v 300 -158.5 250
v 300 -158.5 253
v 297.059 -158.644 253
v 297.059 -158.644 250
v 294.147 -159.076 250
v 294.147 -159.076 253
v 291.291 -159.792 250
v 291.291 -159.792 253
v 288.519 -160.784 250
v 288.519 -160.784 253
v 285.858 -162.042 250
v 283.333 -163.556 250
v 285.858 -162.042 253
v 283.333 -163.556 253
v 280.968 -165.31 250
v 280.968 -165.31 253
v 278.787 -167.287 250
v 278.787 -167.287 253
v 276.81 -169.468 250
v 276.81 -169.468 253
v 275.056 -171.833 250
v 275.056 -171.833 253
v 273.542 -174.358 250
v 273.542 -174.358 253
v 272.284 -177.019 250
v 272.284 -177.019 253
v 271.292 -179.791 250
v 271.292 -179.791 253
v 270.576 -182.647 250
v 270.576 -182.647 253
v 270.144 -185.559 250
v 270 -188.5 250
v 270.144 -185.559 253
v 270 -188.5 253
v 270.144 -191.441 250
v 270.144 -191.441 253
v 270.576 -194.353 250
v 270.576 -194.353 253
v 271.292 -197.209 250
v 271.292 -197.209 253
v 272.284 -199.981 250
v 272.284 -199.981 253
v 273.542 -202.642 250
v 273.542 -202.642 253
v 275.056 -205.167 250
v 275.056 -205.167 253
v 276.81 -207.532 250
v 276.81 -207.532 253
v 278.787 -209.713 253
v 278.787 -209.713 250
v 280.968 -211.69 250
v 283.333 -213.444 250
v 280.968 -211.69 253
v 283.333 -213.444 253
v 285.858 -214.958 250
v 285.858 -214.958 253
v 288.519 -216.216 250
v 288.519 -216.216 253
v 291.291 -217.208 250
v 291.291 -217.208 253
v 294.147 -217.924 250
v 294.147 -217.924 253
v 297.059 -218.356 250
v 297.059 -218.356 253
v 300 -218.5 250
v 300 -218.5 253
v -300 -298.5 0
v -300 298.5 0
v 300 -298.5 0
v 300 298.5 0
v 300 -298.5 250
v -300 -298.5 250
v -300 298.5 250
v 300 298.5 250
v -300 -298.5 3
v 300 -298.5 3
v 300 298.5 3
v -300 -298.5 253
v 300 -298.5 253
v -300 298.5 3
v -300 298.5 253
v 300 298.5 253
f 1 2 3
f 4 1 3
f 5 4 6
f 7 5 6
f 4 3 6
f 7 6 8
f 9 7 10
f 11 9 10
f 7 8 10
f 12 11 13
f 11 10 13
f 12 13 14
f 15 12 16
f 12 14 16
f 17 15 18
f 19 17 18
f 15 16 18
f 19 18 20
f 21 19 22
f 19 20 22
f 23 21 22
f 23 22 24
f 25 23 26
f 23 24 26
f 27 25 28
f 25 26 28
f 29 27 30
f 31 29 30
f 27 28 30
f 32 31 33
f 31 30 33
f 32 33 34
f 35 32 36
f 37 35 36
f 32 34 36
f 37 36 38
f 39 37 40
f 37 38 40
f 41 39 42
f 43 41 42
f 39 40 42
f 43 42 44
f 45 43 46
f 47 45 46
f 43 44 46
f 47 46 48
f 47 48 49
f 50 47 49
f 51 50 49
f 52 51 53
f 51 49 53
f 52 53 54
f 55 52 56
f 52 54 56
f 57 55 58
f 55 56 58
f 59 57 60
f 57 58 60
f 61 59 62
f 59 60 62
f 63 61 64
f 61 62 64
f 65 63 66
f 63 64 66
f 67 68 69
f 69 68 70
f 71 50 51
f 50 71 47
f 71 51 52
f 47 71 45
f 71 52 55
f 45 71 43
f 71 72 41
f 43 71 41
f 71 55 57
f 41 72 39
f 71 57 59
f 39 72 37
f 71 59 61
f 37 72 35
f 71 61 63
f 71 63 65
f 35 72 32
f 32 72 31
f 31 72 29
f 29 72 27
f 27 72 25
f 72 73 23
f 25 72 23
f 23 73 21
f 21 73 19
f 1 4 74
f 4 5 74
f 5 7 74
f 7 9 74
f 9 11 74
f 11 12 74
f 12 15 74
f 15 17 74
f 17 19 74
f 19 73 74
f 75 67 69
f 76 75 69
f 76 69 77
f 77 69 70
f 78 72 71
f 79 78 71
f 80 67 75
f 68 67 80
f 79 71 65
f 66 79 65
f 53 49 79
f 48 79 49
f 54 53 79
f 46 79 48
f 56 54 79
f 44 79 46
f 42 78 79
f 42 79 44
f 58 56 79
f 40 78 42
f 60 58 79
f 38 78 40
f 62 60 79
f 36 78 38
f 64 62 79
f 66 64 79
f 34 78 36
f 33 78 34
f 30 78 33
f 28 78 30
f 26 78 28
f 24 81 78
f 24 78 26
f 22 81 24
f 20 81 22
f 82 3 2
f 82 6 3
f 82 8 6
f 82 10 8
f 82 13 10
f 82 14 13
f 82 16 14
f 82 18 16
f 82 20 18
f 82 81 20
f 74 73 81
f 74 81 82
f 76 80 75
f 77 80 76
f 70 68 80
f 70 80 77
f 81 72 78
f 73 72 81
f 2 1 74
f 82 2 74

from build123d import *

# Parameters (mm, degrees)
F0_W     = 600
F0_H     = 597
F1_DEPTH = 3
F4_DEPTH = 3


with BuildPart() as f1:
    # F0 (on Top) → F1 (new body)
    with BuildSketch(Plane.XY):
        Rectangle(F0_W, F0_H)
    extrude(amount=F1_DEPTH)


with BuildPart() as f2_1:
    # F2: copy of F1
    add(f1.part.moved(Location((0, 0, 250))))

    # F3 (on face) → F4 (cut, through all)
    with BuildSketch(Plane.XY.offset(253)):
        with BuildLine():
            ThreePointArc((300, -158.5), (270, -188.5), (300, -218.5))
            Line((300, -218.5), (300, -158.5))
        make_face()
    extrude(amount=-F4_DEPTH, mode=Mode.SUBTRACT)


solid = Compound([f1.part, f2_1.part])
